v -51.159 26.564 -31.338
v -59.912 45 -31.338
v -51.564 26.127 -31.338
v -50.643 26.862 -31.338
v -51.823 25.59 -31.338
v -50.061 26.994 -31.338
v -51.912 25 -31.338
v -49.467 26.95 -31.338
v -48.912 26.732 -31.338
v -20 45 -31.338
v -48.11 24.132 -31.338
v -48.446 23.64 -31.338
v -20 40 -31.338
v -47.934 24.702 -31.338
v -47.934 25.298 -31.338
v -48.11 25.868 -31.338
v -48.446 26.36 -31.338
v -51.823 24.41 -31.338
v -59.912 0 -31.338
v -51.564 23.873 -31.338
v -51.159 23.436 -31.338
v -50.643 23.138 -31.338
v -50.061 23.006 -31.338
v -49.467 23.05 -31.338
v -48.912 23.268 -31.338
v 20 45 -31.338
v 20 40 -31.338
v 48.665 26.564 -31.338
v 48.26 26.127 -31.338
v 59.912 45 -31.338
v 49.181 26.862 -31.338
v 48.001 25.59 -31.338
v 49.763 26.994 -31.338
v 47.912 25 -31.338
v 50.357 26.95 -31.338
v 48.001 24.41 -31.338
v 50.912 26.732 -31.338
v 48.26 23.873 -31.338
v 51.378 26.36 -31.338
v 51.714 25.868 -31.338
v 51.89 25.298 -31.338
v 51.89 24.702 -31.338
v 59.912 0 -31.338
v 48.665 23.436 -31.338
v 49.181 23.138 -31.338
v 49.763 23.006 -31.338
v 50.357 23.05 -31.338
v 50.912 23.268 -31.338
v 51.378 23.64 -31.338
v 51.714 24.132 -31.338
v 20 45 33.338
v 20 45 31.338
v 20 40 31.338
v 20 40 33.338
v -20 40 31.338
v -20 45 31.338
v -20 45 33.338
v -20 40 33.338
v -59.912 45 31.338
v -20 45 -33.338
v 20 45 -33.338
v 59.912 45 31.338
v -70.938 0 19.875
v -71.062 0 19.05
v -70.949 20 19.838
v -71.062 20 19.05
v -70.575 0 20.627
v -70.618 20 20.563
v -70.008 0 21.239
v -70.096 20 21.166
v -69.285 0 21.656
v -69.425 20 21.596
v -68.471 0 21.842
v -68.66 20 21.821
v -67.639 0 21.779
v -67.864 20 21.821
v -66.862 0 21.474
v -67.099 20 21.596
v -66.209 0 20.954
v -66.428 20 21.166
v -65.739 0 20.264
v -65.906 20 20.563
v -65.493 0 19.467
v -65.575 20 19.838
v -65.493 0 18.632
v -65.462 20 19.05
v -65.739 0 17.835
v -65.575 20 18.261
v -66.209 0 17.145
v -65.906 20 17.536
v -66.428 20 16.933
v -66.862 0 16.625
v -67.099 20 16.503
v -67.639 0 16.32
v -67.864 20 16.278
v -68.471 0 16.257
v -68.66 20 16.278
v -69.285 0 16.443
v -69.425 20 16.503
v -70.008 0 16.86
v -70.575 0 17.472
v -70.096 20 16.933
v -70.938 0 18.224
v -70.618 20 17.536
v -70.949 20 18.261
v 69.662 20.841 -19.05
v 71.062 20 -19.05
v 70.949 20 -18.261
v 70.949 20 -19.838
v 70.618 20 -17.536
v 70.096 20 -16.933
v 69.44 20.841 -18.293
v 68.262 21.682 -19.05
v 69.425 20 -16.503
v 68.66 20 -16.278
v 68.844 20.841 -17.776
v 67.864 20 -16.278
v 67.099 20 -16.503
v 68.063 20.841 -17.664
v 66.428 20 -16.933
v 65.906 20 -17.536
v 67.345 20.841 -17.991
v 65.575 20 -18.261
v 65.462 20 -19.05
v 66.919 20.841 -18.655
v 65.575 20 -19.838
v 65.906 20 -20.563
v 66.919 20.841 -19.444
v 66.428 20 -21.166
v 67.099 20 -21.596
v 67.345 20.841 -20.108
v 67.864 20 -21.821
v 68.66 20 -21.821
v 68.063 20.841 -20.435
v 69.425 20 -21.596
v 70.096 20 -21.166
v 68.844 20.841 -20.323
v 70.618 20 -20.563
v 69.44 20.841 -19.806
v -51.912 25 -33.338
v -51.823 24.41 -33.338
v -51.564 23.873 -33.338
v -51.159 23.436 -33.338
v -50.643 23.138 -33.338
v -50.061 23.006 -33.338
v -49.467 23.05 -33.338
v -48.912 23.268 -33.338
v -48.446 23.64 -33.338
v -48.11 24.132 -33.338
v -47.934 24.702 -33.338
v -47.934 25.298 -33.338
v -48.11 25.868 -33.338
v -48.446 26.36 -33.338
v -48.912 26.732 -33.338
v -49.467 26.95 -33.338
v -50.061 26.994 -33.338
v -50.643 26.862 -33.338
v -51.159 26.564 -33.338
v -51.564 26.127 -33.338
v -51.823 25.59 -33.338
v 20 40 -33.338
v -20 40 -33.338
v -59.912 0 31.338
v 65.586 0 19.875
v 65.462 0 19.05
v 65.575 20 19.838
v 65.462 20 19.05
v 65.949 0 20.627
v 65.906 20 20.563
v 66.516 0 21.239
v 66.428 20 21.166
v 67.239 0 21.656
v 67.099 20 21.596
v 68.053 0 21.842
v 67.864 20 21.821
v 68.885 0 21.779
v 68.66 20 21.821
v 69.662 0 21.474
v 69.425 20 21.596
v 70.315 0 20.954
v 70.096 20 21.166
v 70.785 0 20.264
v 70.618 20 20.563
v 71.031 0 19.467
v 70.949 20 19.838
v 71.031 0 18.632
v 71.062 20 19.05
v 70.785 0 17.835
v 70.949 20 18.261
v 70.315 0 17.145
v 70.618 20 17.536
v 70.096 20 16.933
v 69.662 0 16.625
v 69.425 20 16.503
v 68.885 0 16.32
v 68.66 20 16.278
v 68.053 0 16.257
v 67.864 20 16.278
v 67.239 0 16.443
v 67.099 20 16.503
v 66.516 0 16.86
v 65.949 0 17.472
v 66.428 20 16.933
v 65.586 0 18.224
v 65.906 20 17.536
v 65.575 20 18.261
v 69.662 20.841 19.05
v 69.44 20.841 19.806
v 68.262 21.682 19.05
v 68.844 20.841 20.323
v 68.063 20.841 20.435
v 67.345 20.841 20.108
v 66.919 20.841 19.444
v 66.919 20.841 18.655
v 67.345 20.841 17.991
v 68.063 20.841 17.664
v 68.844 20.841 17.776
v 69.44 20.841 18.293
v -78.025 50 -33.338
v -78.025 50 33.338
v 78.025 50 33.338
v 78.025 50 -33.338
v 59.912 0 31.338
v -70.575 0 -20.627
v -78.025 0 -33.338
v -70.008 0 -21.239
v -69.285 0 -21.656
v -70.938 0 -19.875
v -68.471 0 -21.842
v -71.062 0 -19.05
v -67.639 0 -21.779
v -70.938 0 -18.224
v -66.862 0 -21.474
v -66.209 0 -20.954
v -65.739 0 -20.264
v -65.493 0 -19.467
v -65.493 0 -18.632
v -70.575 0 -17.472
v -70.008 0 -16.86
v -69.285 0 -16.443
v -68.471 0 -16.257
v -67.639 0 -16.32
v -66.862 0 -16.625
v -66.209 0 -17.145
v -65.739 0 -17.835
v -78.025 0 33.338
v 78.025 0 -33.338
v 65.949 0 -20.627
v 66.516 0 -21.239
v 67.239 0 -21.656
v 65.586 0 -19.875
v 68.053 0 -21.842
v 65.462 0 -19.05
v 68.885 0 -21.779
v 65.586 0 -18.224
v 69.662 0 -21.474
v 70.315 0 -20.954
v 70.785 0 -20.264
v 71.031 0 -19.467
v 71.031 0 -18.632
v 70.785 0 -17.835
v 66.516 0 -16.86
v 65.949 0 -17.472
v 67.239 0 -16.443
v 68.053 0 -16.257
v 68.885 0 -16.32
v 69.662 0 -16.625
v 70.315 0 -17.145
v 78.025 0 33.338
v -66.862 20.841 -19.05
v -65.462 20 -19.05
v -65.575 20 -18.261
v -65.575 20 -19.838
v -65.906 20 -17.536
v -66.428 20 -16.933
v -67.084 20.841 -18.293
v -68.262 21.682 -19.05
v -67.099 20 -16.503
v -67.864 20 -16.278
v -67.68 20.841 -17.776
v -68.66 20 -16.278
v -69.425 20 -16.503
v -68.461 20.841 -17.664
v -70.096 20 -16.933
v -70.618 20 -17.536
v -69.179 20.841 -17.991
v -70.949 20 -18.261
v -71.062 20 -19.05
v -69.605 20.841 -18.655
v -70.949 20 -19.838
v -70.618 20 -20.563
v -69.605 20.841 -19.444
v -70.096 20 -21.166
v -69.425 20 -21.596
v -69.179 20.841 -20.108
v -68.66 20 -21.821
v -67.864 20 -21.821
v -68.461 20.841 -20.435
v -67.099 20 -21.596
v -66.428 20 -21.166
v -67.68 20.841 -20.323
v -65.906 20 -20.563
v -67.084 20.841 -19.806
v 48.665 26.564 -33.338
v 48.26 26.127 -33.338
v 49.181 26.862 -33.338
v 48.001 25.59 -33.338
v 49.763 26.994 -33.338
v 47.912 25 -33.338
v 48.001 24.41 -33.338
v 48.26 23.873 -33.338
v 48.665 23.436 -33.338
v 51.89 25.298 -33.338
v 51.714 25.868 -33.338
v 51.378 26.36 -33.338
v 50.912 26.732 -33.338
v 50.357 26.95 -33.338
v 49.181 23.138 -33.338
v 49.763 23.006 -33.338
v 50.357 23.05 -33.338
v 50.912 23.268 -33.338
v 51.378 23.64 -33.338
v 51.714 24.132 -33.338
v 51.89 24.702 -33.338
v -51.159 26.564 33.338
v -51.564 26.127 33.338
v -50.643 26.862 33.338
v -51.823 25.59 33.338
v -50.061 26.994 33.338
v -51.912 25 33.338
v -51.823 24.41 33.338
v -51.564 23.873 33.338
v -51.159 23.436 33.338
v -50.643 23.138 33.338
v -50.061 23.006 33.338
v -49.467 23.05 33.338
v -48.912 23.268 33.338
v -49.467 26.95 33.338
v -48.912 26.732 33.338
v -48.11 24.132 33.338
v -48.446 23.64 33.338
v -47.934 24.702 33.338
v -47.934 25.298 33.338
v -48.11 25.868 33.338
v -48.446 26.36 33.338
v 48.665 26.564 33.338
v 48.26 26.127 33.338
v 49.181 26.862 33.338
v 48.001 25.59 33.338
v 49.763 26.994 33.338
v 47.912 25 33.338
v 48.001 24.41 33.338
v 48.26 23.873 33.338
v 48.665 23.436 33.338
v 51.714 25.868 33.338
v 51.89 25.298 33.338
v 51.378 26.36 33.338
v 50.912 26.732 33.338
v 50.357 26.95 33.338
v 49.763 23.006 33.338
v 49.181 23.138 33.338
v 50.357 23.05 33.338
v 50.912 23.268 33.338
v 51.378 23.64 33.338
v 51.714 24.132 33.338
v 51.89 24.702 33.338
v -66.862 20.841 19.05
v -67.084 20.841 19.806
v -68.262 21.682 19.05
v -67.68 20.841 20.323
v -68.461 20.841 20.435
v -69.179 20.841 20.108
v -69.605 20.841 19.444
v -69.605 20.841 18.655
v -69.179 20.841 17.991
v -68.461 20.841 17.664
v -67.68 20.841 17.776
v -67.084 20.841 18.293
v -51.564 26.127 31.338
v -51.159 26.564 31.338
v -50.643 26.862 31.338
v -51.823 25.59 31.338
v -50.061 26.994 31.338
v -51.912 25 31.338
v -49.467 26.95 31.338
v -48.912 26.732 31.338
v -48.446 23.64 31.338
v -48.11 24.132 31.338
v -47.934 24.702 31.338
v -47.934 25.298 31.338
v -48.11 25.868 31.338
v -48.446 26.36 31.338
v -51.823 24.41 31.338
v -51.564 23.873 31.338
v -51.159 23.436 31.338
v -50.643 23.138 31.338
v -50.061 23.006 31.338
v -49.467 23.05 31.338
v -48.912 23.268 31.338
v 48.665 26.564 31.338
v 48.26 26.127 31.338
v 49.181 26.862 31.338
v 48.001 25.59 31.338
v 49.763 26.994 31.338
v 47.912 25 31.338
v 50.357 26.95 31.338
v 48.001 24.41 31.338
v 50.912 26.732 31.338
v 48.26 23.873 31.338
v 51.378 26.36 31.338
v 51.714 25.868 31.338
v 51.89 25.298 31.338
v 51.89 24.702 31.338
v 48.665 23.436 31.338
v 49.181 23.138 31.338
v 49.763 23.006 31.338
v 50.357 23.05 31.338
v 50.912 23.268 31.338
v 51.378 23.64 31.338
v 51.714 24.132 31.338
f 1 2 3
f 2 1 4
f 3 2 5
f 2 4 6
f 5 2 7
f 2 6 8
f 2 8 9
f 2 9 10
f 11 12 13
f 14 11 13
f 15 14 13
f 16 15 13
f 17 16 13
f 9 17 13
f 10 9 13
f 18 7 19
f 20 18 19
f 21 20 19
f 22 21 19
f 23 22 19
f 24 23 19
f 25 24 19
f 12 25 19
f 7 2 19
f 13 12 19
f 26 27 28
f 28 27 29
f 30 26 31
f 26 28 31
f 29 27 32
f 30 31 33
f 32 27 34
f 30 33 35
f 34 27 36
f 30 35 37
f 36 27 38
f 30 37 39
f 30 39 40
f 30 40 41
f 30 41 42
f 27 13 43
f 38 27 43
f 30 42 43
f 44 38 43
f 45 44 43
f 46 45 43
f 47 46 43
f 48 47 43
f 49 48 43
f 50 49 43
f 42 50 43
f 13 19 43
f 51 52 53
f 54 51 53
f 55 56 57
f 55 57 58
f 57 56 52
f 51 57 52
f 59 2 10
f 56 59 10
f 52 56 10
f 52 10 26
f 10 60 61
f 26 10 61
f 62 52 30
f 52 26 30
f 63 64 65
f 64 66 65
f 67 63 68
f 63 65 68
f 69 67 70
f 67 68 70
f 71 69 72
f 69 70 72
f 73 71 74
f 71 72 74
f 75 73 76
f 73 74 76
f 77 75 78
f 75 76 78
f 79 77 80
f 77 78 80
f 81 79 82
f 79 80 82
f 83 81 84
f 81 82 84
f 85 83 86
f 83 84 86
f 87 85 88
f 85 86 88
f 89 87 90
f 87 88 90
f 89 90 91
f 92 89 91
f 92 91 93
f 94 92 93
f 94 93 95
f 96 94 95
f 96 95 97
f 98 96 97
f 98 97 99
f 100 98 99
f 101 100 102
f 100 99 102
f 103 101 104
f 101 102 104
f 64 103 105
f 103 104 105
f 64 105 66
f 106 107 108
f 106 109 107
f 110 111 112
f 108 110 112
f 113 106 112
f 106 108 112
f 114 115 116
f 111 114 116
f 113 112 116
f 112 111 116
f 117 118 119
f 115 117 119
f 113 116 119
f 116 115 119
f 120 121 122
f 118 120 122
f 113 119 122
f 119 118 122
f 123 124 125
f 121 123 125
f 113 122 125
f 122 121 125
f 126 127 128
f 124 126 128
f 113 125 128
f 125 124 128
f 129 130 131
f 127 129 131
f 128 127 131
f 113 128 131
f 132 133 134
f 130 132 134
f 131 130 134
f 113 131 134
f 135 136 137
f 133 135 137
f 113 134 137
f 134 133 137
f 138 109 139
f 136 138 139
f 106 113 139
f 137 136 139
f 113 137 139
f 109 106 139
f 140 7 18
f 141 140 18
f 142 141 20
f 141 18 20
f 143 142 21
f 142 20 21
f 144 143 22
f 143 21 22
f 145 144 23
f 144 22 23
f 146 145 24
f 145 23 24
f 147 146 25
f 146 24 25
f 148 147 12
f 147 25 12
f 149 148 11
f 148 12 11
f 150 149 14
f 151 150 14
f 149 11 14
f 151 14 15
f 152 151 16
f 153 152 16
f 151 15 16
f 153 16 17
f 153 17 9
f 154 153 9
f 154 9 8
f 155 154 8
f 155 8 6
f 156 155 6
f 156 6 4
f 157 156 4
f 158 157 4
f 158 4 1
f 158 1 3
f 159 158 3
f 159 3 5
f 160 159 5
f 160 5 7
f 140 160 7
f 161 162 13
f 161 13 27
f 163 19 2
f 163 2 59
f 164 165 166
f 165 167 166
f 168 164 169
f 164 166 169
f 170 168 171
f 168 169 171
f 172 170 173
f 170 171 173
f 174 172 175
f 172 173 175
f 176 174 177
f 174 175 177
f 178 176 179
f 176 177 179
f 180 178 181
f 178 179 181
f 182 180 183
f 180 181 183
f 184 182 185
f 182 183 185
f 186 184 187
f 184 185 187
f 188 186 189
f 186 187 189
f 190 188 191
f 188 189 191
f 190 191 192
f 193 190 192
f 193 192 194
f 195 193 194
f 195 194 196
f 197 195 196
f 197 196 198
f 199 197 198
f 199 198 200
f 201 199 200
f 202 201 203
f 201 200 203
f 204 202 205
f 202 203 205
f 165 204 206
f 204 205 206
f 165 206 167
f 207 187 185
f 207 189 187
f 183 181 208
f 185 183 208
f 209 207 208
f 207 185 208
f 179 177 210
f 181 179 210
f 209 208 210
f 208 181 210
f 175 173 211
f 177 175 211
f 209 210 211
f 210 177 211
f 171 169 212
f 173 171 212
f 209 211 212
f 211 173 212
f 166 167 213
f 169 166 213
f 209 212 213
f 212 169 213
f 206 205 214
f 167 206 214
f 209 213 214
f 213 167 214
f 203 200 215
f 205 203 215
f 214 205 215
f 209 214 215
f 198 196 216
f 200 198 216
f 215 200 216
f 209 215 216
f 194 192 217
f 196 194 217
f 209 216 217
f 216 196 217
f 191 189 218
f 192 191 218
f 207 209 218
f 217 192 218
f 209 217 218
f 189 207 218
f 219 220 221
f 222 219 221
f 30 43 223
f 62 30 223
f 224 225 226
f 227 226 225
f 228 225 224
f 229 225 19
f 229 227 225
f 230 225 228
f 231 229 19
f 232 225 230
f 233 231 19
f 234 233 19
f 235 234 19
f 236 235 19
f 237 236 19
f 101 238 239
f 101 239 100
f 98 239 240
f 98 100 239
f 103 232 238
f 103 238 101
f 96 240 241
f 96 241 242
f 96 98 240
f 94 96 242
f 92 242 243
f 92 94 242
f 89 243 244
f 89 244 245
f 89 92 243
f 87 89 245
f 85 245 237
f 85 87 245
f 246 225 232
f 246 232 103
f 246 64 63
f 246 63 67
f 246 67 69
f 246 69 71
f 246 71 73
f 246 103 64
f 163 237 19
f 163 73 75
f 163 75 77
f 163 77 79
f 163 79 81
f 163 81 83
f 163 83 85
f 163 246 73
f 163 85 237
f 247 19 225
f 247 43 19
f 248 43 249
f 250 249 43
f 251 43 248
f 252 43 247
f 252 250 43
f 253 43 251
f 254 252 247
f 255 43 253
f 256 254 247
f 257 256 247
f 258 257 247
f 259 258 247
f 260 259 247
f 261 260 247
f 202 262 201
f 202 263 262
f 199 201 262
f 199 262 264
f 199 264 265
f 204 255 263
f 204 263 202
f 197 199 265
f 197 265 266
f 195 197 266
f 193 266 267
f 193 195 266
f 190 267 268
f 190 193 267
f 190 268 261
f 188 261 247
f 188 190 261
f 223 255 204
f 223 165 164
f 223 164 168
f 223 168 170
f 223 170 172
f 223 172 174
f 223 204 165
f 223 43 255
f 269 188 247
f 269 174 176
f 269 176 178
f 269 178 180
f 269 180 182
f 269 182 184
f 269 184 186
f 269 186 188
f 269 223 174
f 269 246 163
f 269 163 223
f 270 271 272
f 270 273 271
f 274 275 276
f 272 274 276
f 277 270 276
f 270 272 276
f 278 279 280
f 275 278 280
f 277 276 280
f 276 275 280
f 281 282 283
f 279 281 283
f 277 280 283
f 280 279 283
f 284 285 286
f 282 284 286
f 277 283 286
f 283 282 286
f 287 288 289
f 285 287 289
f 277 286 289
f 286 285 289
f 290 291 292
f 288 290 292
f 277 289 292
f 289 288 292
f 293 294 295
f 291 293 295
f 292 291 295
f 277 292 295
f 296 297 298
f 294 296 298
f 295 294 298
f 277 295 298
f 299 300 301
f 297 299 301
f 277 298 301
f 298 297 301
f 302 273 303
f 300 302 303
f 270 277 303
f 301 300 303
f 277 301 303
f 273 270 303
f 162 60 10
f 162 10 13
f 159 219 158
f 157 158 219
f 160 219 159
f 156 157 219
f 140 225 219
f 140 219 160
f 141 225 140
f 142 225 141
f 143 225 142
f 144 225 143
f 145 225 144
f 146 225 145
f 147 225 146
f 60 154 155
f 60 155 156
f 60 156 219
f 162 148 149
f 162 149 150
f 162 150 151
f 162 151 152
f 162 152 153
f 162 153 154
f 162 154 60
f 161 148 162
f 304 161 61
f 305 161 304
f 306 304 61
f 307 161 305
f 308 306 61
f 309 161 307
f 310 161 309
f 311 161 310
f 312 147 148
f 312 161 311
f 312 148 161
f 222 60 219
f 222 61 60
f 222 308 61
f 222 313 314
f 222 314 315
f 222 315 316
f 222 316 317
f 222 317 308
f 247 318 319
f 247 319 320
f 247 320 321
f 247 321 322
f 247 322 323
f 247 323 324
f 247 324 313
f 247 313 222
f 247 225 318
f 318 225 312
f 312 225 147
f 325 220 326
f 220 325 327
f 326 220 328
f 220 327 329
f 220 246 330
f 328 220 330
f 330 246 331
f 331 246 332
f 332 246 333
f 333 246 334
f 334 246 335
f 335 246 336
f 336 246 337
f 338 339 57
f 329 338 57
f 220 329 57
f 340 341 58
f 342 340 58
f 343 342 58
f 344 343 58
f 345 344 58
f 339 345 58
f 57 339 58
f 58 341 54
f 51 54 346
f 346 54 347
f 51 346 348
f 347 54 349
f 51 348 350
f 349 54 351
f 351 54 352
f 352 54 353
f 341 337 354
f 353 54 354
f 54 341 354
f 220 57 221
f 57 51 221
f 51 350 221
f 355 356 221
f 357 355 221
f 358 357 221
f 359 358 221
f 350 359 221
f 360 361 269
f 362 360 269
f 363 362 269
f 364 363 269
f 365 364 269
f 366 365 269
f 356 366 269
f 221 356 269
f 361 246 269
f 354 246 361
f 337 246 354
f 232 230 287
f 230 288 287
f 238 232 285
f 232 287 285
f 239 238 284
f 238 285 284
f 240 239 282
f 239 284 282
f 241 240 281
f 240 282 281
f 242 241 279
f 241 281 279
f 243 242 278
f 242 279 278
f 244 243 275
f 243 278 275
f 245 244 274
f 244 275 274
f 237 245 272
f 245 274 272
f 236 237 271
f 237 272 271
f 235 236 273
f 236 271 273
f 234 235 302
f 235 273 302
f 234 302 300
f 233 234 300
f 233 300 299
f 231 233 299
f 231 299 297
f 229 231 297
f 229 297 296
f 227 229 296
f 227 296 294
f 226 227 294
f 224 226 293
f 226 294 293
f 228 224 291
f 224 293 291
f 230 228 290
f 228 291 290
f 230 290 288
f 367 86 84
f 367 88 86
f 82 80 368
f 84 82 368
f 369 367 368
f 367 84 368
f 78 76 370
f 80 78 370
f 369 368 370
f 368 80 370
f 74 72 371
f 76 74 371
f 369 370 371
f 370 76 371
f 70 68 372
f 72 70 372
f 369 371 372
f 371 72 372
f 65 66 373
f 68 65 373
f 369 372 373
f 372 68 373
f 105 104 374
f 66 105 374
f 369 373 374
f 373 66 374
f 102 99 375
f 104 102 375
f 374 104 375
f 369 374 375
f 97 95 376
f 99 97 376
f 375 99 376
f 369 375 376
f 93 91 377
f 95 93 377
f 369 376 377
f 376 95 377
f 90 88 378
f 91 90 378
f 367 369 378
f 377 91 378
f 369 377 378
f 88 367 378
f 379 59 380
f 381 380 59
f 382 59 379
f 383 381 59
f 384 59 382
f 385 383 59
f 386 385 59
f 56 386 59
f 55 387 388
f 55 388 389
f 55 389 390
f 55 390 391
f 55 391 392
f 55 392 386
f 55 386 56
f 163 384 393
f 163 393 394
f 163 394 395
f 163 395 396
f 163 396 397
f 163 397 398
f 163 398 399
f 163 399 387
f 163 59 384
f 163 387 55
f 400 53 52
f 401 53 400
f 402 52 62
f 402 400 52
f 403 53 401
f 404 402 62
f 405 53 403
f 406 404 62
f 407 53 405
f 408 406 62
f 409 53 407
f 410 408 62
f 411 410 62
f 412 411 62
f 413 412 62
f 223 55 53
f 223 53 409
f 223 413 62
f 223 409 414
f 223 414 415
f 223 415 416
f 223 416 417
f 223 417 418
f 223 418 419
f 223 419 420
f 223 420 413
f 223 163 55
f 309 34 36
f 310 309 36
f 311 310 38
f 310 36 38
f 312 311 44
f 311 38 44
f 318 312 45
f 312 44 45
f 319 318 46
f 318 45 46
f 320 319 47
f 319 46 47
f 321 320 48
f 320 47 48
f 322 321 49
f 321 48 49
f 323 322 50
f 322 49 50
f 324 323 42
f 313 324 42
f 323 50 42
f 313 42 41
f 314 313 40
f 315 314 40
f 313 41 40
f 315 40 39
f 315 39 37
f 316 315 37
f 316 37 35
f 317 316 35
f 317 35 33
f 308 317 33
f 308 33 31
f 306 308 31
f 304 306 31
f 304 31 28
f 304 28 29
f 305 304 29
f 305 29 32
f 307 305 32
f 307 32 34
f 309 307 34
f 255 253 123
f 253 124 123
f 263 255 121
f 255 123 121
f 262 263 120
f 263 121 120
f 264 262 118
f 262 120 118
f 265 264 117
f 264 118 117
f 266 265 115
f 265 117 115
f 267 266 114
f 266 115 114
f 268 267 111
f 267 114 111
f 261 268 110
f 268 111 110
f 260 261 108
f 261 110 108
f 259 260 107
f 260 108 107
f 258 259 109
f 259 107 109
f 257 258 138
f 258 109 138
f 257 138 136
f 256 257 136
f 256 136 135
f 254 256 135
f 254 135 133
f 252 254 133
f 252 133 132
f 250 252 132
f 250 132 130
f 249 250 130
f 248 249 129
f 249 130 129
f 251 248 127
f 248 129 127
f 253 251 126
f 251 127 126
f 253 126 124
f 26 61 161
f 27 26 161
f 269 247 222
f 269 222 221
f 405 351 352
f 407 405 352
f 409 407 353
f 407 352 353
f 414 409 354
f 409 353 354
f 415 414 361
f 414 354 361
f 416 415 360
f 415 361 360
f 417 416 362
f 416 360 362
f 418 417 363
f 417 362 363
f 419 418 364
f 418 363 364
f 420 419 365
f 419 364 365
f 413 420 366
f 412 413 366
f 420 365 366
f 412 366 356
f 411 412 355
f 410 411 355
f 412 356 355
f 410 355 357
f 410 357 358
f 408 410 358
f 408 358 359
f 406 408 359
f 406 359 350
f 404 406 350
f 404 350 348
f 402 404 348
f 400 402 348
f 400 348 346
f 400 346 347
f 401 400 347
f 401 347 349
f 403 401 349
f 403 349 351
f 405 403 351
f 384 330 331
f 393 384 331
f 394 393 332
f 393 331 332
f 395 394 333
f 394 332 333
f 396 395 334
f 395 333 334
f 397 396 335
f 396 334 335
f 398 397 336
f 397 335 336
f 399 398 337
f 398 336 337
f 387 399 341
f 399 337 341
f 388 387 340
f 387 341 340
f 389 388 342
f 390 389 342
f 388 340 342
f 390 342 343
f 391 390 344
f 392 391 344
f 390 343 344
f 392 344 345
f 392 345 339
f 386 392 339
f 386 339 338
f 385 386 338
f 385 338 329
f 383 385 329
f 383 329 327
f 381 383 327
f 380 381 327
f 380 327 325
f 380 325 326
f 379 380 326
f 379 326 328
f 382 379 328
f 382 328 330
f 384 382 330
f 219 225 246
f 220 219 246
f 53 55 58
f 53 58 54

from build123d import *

# Parameters (mm, degrees)
F1_W     = 156.05
F1_H     = 66.675
F2_DEPTH = 50
F3_D     = 5.6
F3_DEPTH = 20
F3_TIP   = 1.6824097333
F4_W     = 119.824
F4_H     = 62.675
F5_DEPTH = 45
F6_W     = 40
F6_H     = 5
F7_DEPTH = 66.676
F9_D     = 4


with BuildPart() as f2:
    # F1 (on Front) → F2 (new body)
    with BuildSketch(Plane.XZ):
        Rectangle(F1_W, F1_H)
    extrude(amount=-F2_DEPTH)

    # F3
    with Locations(Plane.XZ):
        with Locations((-68.262, 19.0495), (-68.262, -19.0495), (68.262, -19.0495), (68.262, 19.0495)):
            Hole(F3_D / 2, depth=F3_DEPTH)
            with Locations((0, 0, -(F3_DEPTH + F3_TIP / 2))):  # 118° drill point
                Cone(0, F3_D / 2, F3_TIP, mode=Mode.SUBTRACT)

    # F4 (on face) → F5 (cut)
    with BuildSketch(Plane.XZ):
        Rectangle(F4_W, F4_H)
    extrude(amount=-F5_DEPTH, mode=Mode.SUBTRACT)

    # F6 (on face) → F7 (cut, through all)
    with BuildSketch(Plane(origin=(0, 0, -33.3375), x_dir=(1, 0, 0), z_dir=(0, 0, -1))):
        with Locations((0, -42.5)):
            Rectangle(F6_W, F6_H)
    extrude(amount=-F7_DEPTH, mode=Mode.SUBTRACT)

    # F9 (through all)
    with Locations(Plane(origin=(0, 0, -33.3375), x_dir=(1, 0, 0), z_dir=(0, 0, -1))):
        with Locations((-49.912, -25), (49.912, -25)):
            Hole(F9_D / 2)


solid = f2.part
